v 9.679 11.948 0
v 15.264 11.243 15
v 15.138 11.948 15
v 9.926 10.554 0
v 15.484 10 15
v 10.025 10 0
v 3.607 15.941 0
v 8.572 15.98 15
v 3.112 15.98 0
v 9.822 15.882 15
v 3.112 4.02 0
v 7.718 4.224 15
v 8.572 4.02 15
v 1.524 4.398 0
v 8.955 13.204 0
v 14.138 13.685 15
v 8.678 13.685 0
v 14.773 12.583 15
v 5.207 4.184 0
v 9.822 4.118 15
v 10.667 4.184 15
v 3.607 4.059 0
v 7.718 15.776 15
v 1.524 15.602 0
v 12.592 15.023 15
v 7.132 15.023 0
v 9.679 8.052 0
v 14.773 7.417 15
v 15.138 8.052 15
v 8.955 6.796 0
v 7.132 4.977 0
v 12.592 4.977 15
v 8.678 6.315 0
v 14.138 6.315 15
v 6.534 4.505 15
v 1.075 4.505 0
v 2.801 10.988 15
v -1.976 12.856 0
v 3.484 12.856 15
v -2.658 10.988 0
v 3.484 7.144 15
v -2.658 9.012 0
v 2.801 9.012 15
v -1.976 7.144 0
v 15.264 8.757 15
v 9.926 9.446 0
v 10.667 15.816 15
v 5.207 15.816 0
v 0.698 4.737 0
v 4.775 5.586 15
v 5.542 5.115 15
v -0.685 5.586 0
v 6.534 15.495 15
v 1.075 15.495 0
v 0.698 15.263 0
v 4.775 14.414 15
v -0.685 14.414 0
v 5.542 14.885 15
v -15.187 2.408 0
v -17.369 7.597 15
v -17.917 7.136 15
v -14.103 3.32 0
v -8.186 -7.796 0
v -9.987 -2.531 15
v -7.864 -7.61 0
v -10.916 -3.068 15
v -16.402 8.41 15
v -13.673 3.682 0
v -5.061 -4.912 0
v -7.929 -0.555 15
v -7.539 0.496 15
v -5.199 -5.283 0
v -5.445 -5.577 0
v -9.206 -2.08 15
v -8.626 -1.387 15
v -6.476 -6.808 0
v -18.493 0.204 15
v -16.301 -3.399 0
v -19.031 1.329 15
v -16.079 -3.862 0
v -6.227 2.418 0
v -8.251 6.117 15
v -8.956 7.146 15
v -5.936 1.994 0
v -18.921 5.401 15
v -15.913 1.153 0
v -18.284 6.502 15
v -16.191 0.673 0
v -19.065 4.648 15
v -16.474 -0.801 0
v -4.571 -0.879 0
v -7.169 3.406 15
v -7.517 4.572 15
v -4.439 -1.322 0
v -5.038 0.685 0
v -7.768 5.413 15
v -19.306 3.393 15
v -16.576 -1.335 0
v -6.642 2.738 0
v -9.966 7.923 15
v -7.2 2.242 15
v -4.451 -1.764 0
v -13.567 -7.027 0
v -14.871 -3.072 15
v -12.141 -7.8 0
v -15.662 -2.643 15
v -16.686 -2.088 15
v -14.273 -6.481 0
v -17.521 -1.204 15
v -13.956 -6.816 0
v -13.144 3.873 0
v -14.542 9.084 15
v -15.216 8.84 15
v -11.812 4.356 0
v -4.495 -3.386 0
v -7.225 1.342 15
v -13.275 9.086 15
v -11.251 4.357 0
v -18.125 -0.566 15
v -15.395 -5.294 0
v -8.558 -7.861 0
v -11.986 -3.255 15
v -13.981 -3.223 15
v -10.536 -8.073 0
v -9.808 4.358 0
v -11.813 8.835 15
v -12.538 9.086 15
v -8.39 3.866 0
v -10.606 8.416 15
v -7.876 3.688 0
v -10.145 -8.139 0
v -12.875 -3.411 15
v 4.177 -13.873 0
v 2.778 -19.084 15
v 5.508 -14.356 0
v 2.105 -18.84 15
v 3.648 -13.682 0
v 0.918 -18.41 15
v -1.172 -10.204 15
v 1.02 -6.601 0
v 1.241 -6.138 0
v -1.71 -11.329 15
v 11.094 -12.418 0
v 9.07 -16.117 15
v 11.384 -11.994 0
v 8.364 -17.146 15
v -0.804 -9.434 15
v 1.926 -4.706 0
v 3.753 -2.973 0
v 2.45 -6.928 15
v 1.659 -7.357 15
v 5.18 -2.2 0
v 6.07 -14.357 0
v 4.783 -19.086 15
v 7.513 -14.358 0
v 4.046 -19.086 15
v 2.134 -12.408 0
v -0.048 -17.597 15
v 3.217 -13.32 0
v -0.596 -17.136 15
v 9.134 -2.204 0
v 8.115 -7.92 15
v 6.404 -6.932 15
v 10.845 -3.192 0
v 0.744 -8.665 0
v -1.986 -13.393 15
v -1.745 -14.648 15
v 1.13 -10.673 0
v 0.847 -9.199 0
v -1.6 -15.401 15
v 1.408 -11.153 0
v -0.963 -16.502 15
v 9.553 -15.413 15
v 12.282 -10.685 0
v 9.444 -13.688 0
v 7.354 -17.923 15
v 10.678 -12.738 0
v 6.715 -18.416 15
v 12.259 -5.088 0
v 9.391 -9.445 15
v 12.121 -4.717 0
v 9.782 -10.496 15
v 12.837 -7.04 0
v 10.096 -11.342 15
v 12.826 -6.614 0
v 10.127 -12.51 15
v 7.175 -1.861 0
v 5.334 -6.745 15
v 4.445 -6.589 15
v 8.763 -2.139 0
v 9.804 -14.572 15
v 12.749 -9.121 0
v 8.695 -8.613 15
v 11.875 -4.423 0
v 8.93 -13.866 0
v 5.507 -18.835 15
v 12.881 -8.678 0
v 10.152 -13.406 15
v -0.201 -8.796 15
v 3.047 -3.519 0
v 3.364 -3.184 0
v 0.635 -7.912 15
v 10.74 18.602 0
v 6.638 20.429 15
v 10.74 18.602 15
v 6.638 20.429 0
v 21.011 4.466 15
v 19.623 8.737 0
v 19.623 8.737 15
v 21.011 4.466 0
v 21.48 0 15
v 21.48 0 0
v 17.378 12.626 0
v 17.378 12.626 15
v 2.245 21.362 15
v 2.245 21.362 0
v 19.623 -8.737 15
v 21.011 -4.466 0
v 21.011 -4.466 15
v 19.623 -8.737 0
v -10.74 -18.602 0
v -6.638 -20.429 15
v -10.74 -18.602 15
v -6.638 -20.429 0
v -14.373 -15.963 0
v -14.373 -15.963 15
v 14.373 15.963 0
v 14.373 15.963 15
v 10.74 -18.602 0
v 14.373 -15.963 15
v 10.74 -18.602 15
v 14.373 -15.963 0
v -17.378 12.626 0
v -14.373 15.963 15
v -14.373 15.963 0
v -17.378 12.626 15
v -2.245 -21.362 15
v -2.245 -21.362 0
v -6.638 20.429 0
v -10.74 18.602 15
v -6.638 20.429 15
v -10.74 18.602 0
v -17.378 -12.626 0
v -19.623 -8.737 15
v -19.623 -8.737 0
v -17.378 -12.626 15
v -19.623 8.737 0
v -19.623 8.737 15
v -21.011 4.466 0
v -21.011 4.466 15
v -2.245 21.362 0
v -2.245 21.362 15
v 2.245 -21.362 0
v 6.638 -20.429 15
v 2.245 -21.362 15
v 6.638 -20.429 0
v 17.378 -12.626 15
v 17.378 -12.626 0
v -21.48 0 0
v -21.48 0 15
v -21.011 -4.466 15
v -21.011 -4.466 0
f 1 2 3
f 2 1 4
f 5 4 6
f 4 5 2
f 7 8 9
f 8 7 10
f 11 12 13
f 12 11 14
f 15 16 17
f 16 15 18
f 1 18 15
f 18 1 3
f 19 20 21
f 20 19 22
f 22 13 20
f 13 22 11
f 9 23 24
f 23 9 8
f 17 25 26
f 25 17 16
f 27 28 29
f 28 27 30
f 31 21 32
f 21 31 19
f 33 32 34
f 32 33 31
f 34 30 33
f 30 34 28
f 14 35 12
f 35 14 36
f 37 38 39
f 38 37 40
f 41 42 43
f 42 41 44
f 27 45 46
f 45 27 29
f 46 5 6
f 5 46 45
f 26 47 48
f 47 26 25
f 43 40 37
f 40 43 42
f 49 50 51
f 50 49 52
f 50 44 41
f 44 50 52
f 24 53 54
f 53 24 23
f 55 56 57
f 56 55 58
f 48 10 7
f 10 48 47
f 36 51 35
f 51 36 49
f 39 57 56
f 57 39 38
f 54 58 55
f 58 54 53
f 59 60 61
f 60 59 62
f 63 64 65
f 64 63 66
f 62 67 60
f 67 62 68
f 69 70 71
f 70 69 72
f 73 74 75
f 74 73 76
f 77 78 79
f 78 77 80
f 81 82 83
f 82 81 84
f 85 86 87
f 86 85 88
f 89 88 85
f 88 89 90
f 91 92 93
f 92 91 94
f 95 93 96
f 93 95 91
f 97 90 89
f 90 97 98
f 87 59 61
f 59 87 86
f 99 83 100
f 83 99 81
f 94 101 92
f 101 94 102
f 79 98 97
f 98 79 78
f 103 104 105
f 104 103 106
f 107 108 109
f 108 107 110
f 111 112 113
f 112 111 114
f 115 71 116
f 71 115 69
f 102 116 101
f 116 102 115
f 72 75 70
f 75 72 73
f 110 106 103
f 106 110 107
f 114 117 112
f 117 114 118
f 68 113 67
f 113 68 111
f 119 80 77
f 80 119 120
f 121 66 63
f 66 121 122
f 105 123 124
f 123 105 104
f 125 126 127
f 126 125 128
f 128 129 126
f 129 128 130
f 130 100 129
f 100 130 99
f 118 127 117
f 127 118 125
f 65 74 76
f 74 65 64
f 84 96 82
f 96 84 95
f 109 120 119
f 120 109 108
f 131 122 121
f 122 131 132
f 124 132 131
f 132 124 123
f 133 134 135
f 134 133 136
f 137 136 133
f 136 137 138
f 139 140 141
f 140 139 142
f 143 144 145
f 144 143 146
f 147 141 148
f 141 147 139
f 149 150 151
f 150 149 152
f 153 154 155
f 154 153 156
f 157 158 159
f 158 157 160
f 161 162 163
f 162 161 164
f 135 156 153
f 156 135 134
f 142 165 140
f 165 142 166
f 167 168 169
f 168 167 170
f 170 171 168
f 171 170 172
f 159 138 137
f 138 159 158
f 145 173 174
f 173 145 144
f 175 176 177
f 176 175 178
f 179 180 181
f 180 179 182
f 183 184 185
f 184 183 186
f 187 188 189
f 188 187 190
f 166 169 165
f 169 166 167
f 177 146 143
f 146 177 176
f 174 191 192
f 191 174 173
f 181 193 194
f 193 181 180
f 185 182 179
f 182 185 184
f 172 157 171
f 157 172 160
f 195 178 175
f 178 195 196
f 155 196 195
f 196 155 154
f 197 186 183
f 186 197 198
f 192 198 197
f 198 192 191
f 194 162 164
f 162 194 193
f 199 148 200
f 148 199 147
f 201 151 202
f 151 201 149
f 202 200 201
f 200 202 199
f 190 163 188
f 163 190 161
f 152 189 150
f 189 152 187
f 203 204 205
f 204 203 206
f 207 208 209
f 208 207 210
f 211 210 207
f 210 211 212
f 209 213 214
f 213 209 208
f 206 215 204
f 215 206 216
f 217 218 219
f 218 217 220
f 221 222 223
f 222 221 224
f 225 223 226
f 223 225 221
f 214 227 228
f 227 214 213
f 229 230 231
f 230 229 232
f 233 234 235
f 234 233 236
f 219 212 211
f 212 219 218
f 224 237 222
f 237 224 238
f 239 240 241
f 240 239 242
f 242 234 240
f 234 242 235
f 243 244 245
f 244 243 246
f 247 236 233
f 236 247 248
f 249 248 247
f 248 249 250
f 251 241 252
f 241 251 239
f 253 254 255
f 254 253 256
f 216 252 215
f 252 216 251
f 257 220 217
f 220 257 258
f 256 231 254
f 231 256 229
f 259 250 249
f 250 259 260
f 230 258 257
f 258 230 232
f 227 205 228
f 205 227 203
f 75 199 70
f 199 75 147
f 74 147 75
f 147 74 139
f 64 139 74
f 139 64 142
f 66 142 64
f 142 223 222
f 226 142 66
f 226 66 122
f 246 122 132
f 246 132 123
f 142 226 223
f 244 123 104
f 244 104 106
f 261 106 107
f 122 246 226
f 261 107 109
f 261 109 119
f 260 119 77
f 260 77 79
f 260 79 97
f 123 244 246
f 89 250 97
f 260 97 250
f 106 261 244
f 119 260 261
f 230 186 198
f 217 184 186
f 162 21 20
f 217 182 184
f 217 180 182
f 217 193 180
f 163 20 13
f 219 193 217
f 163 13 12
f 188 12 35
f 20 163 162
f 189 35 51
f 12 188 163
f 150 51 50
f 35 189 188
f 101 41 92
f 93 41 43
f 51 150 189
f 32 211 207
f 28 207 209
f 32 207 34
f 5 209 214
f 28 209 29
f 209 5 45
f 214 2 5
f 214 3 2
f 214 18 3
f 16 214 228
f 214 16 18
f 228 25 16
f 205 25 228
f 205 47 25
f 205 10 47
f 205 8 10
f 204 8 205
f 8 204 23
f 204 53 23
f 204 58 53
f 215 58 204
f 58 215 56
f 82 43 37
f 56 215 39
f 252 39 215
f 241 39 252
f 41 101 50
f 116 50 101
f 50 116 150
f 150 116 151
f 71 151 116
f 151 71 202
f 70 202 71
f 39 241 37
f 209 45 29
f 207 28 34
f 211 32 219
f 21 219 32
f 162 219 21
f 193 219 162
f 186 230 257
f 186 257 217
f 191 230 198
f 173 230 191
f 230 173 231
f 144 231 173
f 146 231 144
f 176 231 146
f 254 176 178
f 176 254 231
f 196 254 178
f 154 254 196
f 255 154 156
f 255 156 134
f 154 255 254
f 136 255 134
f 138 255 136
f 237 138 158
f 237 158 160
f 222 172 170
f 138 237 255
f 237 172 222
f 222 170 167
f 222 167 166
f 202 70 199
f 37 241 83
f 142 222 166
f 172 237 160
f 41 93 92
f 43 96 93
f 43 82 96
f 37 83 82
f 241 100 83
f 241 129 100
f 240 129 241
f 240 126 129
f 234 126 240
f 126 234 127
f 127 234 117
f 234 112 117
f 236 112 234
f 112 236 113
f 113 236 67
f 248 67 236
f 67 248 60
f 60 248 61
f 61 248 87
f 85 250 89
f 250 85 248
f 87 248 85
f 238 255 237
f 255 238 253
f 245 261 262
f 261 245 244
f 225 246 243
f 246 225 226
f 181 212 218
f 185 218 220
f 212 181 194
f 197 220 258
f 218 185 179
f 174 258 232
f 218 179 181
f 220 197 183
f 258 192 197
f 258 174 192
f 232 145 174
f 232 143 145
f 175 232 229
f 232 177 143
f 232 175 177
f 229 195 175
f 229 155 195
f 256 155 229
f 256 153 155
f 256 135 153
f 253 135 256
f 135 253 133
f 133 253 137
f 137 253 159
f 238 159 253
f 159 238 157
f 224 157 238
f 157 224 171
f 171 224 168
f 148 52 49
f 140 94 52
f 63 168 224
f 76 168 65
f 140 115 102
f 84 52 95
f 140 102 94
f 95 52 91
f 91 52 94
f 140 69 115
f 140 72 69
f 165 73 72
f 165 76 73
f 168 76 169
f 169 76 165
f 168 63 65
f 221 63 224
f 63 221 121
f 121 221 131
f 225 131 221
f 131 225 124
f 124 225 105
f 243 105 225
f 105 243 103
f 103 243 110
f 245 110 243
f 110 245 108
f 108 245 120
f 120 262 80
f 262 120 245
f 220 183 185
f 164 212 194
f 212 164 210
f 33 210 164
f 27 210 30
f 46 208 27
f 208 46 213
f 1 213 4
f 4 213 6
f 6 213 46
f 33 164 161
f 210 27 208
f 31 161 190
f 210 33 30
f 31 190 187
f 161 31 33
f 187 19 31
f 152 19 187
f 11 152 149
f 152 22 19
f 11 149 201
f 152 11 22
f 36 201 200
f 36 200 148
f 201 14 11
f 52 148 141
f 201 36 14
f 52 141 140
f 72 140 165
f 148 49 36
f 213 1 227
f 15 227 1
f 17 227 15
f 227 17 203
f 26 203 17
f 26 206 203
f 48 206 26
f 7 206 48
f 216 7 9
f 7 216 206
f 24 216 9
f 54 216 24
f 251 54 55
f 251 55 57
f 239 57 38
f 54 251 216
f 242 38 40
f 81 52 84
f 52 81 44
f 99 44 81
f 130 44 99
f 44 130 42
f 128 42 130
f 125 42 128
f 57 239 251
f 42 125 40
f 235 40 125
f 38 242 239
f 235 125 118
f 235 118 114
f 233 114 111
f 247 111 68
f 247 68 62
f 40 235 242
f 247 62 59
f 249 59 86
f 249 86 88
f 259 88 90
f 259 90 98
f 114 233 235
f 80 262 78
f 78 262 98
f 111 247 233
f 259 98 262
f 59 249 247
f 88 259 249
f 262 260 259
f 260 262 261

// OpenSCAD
// [FL_INDEX: keywords="openscad, 3d_parametric, Customizable_Bean_Pole_holder__to_make_a_tepee_type_frame_for_peas_and_beans_to, csg_solid" | COT="Parametric OpenSCAD design from 3DCodeverse"]
// Title: Customizable Bean Pole holder, to make a tepee type frame for peas and beans to climb

number_of_holes=3; // [2:6]
hole_Angle=20; // [0:40]
hole_Size=12;
thickness=15;
additional_gerth=0;



divider=360/number_of_holes;
holeRadius=hole_Size/2;

if (hole_Angle > 20) 
{
  printitem(hole_Angle-20);
} else {
  printitem(0);
}






module printitem(invar) {
	pieceSize=(hole_Size*3.33)+number_of_holes+invar+additional_gerth;
	pieceRadius=pieceSize/2;
	difference(){
		cylinder(r=pieceRadius,h=thickness);
		for (a=[0:number_of_holes-1]) {
			rotate([0,0,divider*a])translate([0,hole_Size-(5-number_of_holes),-10])rotate([0,hole_Angle,0])cylinder(r=holeRadius,h=thickness*3);
		}

	}
}
